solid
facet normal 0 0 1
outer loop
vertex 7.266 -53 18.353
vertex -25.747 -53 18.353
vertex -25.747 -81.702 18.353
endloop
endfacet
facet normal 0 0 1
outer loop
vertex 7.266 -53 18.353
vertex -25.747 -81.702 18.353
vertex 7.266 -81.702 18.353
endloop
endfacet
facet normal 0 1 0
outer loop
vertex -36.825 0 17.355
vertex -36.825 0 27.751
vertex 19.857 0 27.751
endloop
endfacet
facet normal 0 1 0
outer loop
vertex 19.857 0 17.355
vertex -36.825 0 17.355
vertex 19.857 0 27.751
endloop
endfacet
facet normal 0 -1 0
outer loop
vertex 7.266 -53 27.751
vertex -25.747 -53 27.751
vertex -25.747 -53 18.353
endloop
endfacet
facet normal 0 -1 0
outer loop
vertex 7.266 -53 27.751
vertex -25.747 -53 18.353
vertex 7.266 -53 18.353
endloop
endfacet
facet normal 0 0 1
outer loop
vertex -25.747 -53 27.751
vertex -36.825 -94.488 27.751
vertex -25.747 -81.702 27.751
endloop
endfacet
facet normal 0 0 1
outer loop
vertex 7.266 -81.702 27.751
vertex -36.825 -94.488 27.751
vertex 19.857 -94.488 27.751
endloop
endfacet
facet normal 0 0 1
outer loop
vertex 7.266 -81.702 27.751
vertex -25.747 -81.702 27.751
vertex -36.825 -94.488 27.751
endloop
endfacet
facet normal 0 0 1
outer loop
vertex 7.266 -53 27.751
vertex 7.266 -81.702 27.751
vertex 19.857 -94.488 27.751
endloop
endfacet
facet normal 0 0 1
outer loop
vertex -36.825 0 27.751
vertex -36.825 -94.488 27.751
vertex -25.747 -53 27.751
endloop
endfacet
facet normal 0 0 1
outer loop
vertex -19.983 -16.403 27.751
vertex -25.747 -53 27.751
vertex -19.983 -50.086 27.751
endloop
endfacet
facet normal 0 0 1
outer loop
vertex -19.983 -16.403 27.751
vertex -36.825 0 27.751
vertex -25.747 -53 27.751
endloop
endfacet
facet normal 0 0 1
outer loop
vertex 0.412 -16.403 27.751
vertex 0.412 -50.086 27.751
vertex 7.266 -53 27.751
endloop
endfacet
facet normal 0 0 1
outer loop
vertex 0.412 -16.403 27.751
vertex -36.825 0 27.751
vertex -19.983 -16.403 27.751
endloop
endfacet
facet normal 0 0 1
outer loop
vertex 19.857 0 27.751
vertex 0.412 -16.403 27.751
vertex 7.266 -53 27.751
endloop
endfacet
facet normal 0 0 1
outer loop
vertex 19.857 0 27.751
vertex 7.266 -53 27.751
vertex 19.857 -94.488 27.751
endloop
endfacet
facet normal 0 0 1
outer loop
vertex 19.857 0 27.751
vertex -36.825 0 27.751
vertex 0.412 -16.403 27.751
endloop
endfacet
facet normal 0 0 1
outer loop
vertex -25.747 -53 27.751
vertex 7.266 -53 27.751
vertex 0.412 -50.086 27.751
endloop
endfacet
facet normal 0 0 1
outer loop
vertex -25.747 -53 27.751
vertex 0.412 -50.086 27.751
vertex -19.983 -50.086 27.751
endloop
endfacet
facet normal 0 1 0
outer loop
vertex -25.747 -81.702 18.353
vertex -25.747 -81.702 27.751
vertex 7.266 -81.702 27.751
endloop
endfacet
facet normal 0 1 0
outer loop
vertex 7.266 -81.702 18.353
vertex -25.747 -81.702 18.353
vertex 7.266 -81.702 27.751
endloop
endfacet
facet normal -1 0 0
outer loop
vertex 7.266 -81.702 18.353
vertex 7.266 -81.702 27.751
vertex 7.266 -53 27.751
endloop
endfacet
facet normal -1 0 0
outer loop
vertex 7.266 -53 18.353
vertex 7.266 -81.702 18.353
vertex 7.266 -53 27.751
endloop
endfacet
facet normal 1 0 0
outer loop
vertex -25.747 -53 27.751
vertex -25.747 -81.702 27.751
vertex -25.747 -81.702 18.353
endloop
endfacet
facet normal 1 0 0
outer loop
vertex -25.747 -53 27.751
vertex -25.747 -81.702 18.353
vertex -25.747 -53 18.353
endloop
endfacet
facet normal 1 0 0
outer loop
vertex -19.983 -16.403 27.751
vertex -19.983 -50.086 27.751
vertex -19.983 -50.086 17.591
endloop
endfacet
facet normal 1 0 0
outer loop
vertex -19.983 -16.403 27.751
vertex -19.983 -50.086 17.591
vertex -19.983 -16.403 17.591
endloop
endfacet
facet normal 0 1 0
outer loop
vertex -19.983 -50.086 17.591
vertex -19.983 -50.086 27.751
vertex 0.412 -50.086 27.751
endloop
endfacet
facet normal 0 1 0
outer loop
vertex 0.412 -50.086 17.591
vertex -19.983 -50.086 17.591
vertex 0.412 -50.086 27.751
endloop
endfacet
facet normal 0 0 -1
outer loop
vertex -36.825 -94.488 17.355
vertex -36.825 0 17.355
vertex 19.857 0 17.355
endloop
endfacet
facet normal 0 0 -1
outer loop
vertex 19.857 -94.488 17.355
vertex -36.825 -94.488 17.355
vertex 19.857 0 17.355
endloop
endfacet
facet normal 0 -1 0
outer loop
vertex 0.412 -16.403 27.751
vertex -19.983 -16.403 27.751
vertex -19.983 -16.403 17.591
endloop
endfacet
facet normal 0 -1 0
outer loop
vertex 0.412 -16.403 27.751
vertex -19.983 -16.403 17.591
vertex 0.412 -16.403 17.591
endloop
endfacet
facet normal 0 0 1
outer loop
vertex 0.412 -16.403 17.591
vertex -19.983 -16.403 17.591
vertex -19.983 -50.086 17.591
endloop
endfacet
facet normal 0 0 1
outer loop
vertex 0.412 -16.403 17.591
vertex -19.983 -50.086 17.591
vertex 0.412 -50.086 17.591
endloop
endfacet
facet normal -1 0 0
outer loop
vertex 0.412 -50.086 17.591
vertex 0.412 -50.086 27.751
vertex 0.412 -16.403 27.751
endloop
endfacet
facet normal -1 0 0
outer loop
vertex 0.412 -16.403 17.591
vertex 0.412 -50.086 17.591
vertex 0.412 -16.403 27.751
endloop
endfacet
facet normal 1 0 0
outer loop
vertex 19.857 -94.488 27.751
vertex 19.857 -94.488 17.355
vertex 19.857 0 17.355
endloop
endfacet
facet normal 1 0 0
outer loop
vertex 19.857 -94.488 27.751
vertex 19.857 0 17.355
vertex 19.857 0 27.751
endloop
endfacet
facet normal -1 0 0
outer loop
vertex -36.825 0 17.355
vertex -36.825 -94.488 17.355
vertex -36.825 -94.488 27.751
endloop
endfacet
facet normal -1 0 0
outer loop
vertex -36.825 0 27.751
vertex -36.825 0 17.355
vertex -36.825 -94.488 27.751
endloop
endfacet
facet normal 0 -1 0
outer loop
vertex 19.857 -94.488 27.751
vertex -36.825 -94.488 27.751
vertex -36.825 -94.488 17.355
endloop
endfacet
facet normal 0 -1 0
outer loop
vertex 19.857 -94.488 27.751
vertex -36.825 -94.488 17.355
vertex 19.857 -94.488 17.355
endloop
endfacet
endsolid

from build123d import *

# Parameters (mm, degrees)
F0_W     = 56.681249
F0_H     = 10.396719
F1_DEPTH = 94.488
F2_W     = 31.195983
F2_H     = 31.680895
F3_DEPTH = 2.54
F4_W     = 20.394963
F4_H     = 33.683496
F5_DEPTH = 10.16
F6_W     = 33.012585
F6_H     = 28.702568
F7_DEPTH = 9.398


with BuildPart() as f1:
    # F0 (on Front) → F1 (new body)
    with BuildSketch(Plane.XZ):
        with Locations((-8.483941, 22.552885)):
            Rectangle(F0_W, F0_H)
    extrude(amount=F1_DEPTH)

    # F2 (on face) → F3 (join)
    with BuildSketch(Plane.XY.offset(27.751245)):
        with Locations((-9.093156, -17.717516)):
            Rectangle(F2_W, F2_H)
    extrude(amount=-F3_DEPTH)

    # F4 (on face) → F5 (cut)
    with BuildSketch(Plane.XY.offset(27.751245)):
        with Locations((-9.785975, -33.244646)):
            Rectangle(F4_W, F4_H)
    extrude(amount=-F5_DEPTH, mode=Mode.SUBTRACT)

    # F6 (on face) → F7 (cut)
    with BuildSketch(Plane.XY.offset(27.751245)):
        with Locations((-9.240382, -67.351179)):
            Rectangle(F6_W, F6_H)
    extrude(amount=-F7_DEPTH, mode=Mode.SUBTRACT)


solid = f1.part
